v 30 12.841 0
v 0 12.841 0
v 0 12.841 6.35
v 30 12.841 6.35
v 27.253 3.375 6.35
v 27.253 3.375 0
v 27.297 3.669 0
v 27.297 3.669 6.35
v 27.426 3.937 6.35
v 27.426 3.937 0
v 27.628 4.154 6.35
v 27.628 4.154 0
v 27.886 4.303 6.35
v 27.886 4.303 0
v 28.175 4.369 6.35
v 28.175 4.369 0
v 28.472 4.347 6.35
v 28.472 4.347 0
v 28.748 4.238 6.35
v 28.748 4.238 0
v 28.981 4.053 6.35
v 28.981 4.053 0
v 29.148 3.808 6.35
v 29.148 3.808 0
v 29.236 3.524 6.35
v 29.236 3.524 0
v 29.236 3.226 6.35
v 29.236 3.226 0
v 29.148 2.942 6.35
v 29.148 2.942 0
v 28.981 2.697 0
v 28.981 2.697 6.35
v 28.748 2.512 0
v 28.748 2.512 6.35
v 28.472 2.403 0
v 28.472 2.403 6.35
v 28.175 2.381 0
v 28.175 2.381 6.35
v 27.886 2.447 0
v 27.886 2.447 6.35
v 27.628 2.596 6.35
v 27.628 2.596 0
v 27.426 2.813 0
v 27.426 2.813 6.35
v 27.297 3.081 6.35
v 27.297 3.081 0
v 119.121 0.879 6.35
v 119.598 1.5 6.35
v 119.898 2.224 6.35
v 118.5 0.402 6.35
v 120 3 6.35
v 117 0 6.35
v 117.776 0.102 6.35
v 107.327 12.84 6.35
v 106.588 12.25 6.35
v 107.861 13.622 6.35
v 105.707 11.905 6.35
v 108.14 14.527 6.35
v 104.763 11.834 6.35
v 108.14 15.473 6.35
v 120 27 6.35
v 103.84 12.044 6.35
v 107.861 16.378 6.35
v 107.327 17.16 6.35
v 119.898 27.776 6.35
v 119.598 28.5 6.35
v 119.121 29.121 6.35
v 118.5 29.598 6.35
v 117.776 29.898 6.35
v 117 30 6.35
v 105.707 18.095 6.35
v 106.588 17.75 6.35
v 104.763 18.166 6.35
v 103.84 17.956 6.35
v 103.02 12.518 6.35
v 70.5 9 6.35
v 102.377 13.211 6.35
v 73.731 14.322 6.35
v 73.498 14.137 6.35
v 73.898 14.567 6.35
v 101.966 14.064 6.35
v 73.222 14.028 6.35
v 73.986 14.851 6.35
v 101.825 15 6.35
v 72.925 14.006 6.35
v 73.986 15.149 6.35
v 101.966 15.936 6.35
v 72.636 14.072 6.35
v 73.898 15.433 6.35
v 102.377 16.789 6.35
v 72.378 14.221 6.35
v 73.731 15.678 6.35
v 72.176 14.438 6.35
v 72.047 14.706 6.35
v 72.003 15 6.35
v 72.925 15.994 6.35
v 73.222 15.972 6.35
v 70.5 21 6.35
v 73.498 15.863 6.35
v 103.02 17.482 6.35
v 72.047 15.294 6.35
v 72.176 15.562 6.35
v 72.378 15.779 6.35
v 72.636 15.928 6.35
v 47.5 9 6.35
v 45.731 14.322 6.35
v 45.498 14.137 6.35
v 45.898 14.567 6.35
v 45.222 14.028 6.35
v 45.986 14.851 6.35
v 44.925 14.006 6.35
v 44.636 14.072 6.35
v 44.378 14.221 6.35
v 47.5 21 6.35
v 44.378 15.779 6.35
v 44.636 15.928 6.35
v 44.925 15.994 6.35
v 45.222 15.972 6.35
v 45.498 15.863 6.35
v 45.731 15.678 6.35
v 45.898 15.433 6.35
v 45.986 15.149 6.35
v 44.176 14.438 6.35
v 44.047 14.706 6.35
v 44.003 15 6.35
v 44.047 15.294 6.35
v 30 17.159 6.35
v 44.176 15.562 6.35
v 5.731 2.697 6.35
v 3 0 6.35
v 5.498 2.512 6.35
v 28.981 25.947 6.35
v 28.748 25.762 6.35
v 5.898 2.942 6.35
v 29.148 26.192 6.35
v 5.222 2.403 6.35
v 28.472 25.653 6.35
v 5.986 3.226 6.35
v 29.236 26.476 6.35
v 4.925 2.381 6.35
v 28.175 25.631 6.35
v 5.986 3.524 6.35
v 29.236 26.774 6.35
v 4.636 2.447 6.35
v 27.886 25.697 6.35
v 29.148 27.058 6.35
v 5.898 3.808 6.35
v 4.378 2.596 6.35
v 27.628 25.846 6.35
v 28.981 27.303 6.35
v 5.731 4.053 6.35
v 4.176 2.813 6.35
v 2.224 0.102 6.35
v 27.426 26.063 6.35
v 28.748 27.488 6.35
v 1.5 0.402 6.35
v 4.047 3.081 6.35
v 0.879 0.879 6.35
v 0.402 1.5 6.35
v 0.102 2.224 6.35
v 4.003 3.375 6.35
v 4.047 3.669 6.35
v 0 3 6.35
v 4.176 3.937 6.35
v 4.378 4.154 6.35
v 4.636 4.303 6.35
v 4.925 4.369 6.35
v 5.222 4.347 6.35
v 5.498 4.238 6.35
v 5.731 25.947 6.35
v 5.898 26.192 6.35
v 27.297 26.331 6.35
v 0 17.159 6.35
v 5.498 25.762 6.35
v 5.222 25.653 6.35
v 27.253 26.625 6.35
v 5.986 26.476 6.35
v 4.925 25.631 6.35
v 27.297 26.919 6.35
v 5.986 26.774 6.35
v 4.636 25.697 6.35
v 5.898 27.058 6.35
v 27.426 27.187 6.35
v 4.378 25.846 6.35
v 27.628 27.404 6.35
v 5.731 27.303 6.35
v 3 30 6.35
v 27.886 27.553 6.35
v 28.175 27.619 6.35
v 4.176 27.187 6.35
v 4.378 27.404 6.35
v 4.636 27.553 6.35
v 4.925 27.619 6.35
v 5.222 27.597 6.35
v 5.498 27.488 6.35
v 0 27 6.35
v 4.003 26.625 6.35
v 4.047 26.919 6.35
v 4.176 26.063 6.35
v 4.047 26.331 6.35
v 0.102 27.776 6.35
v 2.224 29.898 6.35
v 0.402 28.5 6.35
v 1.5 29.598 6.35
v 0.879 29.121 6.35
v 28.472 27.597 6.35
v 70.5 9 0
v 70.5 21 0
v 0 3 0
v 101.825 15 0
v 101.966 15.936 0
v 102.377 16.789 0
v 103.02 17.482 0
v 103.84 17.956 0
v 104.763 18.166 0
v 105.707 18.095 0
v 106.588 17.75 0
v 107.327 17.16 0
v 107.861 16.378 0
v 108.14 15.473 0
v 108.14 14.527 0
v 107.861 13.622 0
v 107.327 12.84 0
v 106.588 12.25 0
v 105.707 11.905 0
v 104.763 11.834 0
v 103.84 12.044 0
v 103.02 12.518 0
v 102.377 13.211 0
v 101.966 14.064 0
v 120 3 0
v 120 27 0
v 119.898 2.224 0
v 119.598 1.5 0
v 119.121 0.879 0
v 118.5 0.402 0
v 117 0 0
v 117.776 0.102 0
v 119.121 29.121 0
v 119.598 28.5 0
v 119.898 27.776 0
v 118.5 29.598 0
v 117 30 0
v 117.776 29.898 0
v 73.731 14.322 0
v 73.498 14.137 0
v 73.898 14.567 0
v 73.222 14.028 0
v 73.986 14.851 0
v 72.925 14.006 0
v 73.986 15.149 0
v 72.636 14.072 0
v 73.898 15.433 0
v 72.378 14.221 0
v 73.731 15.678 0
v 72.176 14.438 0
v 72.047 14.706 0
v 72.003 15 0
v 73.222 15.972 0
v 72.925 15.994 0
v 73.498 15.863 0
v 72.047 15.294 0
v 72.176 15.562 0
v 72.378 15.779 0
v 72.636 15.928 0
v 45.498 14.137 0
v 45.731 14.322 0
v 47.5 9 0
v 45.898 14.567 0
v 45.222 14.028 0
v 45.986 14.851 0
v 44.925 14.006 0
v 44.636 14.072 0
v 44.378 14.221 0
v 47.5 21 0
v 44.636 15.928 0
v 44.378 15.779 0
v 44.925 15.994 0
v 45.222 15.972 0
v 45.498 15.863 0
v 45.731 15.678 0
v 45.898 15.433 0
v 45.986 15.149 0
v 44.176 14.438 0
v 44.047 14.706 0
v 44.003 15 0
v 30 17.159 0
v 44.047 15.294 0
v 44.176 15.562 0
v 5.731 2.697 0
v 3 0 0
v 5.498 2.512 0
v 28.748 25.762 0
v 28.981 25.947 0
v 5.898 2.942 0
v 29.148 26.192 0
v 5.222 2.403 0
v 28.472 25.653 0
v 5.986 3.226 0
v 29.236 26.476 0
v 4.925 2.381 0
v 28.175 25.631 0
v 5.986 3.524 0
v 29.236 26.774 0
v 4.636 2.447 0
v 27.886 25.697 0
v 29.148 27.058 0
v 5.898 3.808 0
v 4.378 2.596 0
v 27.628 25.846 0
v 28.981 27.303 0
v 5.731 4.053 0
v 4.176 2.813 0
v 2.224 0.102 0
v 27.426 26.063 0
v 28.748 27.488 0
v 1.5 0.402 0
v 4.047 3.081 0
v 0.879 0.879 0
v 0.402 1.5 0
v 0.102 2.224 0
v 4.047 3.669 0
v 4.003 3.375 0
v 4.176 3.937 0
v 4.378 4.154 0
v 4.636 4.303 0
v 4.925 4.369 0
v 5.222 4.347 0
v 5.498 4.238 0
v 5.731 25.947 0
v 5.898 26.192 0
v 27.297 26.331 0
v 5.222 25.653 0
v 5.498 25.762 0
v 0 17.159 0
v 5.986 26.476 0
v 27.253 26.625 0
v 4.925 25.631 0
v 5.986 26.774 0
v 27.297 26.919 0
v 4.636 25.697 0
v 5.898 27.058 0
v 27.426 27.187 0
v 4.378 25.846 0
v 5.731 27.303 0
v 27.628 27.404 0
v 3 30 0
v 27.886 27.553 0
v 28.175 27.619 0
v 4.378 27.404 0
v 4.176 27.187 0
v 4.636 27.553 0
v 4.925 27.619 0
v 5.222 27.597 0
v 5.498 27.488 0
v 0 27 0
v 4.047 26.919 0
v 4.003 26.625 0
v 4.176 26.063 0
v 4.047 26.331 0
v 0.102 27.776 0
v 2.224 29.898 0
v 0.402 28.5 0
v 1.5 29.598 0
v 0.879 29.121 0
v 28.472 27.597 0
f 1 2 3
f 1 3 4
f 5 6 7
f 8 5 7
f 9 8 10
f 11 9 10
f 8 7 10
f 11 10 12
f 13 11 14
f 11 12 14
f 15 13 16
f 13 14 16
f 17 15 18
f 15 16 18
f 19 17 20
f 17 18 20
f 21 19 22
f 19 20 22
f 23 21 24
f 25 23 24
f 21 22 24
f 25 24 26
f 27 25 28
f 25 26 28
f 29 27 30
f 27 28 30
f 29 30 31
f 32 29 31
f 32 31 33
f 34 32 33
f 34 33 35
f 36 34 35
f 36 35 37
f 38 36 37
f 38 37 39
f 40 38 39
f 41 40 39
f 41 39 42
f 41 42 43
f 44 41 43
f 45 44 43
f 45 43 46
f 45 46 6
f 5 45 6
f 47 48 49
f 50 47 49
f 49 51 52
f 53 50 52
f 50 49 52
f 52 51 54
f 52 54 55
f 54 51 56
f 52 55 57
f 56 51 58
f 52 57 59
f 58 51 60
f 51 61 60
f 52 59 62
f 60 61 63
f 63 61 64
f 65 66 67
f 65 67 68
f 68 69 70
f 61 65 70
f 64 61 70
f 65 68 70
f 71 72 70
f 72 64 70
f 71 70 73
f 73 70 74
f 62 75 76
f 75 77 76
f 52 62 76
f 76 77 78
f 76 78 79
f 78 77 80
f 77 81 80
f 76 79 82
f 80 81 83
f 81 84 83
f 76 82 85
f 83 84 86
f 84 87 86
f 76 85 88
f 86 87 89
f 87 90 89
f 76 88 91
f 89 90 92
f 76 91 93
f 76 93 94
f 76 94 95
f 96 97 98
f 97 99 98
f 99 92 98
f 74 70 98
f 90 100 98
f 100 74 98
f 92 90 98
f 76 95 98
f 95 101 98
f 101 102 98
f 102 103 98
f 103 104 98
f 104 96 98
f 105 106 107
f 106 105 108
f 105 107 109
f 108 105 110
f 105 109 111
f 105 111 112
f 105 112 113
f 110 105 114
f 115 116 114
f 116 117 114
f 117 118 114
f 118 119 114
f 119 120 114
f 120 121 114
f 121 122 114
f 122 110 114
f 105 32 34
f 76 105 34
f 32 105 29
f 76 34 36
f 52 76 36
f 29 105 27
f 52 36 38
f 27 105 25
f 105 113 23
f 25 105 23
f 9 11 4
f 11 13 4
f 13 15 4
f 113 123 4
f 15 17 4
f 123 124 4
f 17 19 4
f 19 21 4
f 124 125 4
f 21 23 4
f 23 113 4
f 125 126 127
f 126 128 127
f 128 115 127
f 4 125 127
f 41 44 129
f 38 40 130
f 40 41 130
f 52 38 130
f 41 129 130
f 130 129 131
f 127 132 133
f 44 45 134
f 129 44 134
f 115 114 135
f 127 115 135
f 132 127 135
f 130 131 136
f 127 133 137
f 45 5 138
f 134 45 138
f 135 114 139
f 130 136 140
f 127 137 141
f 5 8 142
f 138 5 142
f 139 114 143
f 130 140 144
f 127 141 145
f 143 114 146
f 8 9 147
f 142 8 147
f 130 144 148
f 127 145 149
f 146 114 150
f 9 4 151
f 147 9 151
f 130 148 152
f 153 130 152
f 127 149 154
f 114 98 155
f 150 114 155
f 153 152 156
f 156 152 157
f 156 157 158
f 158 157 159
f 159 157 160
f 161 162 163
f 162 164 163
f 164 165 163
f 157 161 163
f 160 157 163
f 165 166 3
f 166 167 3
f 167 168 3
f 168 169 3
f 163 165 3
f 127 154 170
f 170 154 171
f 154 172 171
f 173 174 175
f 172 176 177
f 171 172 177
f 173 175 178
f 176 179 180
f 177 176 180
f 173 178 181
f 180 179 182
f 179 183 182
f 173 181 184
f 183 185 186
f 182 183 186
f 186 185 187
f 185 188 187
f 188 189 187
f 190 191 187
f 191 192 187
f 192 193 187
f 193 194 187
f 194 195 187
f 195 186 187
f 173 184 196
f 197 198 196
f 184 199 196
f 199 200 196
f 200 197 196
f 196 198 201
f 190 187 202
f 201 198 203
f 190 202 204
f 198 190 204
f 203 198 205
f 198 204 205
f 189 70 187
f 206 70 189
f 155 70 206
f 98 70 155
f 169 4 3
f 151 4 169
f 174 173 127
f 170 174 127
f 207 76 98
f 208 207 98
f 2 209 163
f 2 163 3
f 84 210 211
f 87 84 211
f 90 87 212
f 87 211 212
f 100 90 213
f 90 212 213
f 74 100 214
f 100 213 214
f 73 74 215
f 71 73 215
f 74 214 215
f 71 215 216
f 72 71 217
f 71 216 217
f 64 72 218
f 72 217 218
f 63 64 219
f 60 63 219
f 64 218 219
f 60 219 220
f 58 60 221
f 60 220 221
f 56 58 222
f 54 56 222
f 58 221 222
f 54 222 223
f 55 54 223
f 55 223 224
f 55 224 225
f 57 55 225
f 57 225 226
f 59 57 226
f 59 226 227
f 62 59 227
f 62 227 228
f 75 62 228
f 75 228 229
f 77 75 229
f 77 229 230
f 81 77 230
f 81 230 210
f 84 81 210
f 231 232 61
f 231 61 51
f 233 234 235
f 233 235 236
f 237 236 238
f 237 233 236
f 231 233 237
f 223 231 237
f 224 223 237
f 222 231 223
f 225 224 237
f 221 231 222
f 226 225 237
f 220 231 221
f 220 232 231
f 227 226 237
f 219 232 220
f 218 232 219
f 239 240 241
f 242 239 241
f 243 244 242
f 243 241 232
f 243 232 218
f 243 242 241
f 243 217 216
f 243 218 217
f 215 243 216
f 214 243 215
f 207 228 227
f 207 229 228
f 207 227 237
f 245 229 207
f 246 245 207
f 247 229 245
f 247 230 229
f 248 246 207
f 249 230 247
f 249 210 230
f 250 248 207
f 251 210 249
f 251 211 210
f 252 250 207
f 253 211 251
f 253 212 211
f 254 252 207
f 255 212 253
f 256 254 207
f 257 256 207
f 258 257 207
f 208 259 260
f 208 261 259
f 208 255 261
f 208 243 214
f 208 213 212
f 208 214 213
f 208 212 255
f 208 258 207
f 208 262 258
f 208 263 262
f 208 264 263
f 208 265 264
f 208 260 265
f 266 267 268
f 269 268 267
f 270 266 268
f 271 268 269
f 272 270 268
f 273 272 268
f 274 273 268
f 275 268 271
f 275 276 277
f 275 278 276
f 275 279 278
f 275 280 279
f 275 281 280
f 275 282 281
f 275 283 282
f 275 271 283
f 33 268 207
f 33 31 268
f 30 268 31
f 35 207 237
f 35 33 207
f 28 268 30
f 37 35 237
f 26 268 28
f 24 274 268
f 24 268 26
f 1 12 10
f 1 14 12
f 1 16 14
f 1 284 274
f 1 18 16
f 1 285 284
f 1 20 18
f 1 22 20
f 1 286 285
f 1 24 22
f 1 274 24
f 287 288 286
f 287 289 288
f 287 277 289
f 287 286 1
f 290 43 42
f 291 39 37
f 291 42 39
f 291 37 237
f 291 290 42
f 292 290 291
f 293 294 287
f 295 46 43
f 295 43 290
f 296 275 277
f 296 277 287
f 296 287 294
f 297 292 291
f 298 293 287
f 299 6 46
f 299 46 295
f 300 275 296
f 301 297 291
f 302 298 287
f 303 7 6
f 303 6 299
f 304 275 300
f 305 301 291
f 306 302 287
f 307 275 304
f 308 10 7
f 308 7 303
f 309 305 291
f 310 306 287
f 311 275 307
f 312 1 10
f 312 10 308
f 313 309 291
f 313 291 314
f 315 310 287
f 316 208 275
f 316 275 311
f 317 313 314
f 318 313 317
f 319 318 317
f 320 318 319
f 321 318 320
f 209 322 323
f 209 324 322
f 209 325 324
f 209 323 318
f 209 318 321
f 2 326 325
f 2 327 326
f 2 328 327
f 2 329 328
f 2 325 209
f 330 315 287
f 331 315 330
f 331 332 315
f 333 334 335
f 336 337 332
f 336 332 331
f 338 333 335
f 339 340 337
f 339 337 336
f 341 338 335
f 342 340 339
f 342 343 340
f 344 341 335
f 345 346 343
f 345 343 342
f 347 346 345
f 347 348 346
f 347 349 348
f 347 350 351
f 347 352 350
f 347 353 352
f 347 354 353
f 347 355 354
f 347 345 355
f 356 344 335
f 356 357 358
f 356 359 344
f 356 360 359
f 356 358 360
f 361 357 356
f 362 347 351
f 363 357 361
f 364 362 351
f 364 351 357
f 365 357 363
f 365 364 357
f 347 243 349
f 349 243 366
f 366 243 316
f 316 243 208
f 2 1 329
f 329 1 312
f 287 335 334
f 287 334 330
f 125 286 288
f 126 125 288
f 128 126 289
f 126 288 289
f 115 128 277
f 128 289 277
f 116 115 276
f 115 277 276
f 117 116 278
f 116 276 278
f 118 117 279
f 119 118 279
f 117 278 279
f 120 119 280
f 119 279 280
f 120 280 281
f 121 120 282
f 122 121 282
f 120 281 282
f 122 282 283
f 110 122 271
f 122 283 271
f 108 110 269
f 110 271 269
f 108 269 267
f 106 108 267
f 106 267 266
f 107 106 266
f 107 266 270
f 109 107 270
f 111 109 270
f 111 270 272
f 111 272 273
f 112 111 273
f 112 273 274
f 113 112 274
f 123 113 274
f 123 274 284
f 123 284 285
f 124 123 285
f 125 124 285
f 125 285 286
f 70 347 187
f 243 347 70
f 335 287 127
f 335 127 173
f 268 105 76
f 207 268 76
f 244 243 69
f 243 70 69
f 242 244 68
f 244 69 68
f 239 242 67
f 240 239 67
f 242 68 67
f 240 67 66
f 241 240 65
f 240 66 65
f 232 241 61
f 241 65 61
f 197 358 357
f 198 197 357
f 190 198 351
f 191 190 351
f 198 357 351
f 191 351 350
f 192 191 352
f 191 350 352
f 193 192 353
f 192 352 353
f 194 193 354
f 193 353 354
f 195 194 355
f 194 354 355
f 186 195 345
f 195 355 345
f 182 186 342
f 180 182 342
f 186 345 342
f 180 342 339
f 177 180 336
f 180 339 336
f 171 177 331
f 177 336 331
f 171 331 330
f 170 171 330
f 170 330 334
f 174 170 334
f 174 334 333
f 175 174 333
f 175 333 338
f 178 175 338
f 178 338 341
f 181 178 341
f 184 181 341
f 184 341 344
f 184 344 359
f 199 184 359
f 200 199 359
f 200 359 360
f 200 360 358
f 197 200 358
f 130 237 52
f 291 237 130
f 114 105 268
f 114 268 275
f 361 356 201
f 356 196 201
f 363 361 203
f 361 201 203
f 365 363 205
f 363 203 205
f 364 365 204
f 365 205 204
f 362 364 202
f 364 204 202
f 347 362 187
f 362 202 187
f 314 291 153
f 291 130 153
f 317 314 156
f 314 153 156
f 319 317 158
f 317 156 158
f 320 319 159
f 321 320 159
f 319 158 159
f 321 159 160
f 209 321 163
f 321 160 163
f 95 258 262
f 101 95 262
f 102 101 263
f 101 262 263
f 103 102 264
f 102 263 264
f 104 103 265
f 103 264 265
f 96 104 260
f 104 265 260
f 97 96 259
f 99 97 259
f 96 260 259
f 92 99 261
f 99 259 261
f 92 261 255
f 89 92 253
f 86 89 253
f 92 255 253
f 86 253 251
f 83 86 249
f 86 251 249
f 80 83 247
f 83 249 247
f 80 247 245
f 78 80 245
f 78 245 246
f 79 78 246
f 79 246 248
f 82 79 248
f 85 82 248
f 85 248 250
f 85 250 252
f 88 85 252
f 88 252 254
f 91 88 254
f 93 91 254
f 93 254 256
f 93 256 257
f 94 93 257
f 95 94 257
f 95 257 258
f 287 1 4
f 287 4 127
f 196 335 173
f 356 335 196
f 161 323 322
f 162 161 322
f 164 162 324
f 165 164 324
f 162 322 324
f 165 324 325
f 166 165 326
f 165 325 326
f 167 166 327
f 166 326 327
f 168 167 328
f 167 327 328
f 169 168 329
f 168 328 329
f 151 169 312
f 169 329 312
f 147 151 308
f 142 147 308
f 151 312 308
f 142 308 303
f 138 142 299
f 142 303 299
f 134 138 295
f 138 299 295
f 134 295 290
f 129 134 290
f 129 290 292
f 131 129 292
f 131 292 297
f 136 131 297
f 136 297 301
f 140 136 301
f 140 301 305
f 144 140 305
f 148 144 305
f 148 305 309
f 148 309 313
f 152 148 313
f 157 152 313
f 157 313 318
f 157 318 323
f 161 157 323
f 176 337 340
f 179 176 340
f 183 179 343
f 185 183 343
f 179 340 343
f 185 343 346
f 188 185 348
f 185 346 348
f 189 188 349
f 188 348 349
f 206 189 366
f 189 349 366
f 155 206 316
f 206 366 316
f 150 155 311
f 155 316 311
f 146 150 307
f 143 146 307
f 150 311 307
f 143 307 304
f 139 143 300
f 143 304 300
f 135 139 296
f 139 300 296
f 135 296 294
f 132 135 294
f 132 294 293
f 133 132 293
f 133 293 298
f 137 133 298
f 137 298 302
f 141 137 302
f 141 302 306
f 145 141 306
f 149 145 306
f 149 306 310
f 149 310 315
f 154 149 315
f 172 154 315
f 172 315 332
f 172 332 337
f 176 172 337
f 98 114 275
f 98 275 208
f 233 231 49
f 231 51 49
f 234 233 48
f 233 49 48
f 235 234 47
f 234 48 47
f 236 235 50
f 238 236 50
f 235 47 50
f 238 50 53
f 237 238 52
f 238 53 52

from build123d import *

# Parameters (mm, degrees)
MAIN_SHAPE_DEPTH                              = 6.35
FILLET1_R                                     = 3
ELBOW_X_MOUNT_HOLES_D                         = 1.9939
ELBOW_X_MOUNT_HOLES_DEPTH                     = 7.67
ELBOW_X_MOUNT_HOLES_TIP                       = 0.599027994
SKETCH6_W                                     = 23
SKETCH6_H                                     = 12
CUTOUT_FOR_WRIST_SERVO_DEPTH                  = 7.35
WRIST_SERVO_MOUNTING_HOLES_D                  = 1.9939
F_1_4_0_25_DIAMETER_HOLE_FOR_WRIST_DOWE_D     = 6.35
F_1_4_0_25_DIAMETER_HOLE_FOR_WRIST_DOWE_DEPTH = 18
F_1_4_0_25_DIAMETER_HOLE_FOR_WRIST_DOWE_TIP   = 1.907732465


with BuildPart() as part:
    # Sketch1 → main shape (new body)
    with BuildSketch(Plane.XY):
        Polygon((0, 17.159), (0, 30), (120, 30), (120, 0), (0, 0), (0, 12.841), (30, 12.841), (30, 17.159), align=None)
    extrude(amount=MAIN_SHAPE_DEPTH)

    # Fillet1
    fillet1_edges = [part.edges().sort_by_distance(p)[0] for p in [
        (0, 30, 3.175),
        (120, 30, 3.175),
        (120, 0, 3.175),
        (0, 0, 3.175),
    ]]
    fillet(fillet1_edges, radius=FILLET1_R)

    # elbow X mount holes
    with Locations(Plane.XY.offset(6.35)):
        with Locations((5, 26.625), (28.25, 26.625), (28.25, 3.375), (5, 3.375)):
            Hole(ELBOW_X_MOUNT_HOLES_D / 2, depth=ELBOW_X_MOUNT_HOLES_DEPTH)
            with Locations((0, 0, -(ELBOW_X_MOUNT_HOLES_DEPTH + ELBOW_X_MOUNT_HOLES_TIP / 2))):  # 118° drill point
                Cone(0, ELBOW_X_MOUNT_HOLES_D / 2, ELBOW_X_MOUNT_HOLES_TIP, mode=Mode.SUBTRACT)

    # Sketch6 → cutout for wrist servo (cut, through all)
    with BuildSketch(Plane.XY.offset(6.35)):
        with Locations((59, 15)):
            Rectangle(SKETCH6_W, SKETCH6_H)
    extrude(amount=-CUTOUT_FOR_WRIST_SERVO_DEPTH, mode=Mode.SUBTRACT)

    # wrist servo mounting holes (through all)
    with Locations(Plane.XY.offset(6.35)):
        with Locations((45, 15), (73, 15)):
            Hole(WRIST_SERVO_MOUNTING_HOLES_D / 2)

    # 1/4 (0.25) Diameter Hole (for wrist dowel)
    with Locations(Plane.XY.offset(6.35)):
        with Locations((105, 15)):
            Hole(F_1_4_0_25_DIAMETER_HOLE_FOR_WRIST_DOWE_D / 2, depth=F_1_4_0_25_DIAMETER_HOLE_FOR_WRIST_DOWE_DEPTH)
            with Locations((0, 0, -(F_1_4_0_25_DIAMETER_HOLE_FOR_WRIST_DOWE_DEPTH + F_1_4_0_25_DIAMETER_HOLE_FOR_WRIST_DOWE_TIP / 2))):  # 118° drill point
                Cone(0, F_1_4_0_25_DIAMETER_HOLE_FOR_WRIST_DOWE_D / 2, F_1_4_0_25_DIAMETER_HOLE_FOR_WRIST_DOWE_TIP, mode=Mode.SUBTRACT)


solid = part.part
